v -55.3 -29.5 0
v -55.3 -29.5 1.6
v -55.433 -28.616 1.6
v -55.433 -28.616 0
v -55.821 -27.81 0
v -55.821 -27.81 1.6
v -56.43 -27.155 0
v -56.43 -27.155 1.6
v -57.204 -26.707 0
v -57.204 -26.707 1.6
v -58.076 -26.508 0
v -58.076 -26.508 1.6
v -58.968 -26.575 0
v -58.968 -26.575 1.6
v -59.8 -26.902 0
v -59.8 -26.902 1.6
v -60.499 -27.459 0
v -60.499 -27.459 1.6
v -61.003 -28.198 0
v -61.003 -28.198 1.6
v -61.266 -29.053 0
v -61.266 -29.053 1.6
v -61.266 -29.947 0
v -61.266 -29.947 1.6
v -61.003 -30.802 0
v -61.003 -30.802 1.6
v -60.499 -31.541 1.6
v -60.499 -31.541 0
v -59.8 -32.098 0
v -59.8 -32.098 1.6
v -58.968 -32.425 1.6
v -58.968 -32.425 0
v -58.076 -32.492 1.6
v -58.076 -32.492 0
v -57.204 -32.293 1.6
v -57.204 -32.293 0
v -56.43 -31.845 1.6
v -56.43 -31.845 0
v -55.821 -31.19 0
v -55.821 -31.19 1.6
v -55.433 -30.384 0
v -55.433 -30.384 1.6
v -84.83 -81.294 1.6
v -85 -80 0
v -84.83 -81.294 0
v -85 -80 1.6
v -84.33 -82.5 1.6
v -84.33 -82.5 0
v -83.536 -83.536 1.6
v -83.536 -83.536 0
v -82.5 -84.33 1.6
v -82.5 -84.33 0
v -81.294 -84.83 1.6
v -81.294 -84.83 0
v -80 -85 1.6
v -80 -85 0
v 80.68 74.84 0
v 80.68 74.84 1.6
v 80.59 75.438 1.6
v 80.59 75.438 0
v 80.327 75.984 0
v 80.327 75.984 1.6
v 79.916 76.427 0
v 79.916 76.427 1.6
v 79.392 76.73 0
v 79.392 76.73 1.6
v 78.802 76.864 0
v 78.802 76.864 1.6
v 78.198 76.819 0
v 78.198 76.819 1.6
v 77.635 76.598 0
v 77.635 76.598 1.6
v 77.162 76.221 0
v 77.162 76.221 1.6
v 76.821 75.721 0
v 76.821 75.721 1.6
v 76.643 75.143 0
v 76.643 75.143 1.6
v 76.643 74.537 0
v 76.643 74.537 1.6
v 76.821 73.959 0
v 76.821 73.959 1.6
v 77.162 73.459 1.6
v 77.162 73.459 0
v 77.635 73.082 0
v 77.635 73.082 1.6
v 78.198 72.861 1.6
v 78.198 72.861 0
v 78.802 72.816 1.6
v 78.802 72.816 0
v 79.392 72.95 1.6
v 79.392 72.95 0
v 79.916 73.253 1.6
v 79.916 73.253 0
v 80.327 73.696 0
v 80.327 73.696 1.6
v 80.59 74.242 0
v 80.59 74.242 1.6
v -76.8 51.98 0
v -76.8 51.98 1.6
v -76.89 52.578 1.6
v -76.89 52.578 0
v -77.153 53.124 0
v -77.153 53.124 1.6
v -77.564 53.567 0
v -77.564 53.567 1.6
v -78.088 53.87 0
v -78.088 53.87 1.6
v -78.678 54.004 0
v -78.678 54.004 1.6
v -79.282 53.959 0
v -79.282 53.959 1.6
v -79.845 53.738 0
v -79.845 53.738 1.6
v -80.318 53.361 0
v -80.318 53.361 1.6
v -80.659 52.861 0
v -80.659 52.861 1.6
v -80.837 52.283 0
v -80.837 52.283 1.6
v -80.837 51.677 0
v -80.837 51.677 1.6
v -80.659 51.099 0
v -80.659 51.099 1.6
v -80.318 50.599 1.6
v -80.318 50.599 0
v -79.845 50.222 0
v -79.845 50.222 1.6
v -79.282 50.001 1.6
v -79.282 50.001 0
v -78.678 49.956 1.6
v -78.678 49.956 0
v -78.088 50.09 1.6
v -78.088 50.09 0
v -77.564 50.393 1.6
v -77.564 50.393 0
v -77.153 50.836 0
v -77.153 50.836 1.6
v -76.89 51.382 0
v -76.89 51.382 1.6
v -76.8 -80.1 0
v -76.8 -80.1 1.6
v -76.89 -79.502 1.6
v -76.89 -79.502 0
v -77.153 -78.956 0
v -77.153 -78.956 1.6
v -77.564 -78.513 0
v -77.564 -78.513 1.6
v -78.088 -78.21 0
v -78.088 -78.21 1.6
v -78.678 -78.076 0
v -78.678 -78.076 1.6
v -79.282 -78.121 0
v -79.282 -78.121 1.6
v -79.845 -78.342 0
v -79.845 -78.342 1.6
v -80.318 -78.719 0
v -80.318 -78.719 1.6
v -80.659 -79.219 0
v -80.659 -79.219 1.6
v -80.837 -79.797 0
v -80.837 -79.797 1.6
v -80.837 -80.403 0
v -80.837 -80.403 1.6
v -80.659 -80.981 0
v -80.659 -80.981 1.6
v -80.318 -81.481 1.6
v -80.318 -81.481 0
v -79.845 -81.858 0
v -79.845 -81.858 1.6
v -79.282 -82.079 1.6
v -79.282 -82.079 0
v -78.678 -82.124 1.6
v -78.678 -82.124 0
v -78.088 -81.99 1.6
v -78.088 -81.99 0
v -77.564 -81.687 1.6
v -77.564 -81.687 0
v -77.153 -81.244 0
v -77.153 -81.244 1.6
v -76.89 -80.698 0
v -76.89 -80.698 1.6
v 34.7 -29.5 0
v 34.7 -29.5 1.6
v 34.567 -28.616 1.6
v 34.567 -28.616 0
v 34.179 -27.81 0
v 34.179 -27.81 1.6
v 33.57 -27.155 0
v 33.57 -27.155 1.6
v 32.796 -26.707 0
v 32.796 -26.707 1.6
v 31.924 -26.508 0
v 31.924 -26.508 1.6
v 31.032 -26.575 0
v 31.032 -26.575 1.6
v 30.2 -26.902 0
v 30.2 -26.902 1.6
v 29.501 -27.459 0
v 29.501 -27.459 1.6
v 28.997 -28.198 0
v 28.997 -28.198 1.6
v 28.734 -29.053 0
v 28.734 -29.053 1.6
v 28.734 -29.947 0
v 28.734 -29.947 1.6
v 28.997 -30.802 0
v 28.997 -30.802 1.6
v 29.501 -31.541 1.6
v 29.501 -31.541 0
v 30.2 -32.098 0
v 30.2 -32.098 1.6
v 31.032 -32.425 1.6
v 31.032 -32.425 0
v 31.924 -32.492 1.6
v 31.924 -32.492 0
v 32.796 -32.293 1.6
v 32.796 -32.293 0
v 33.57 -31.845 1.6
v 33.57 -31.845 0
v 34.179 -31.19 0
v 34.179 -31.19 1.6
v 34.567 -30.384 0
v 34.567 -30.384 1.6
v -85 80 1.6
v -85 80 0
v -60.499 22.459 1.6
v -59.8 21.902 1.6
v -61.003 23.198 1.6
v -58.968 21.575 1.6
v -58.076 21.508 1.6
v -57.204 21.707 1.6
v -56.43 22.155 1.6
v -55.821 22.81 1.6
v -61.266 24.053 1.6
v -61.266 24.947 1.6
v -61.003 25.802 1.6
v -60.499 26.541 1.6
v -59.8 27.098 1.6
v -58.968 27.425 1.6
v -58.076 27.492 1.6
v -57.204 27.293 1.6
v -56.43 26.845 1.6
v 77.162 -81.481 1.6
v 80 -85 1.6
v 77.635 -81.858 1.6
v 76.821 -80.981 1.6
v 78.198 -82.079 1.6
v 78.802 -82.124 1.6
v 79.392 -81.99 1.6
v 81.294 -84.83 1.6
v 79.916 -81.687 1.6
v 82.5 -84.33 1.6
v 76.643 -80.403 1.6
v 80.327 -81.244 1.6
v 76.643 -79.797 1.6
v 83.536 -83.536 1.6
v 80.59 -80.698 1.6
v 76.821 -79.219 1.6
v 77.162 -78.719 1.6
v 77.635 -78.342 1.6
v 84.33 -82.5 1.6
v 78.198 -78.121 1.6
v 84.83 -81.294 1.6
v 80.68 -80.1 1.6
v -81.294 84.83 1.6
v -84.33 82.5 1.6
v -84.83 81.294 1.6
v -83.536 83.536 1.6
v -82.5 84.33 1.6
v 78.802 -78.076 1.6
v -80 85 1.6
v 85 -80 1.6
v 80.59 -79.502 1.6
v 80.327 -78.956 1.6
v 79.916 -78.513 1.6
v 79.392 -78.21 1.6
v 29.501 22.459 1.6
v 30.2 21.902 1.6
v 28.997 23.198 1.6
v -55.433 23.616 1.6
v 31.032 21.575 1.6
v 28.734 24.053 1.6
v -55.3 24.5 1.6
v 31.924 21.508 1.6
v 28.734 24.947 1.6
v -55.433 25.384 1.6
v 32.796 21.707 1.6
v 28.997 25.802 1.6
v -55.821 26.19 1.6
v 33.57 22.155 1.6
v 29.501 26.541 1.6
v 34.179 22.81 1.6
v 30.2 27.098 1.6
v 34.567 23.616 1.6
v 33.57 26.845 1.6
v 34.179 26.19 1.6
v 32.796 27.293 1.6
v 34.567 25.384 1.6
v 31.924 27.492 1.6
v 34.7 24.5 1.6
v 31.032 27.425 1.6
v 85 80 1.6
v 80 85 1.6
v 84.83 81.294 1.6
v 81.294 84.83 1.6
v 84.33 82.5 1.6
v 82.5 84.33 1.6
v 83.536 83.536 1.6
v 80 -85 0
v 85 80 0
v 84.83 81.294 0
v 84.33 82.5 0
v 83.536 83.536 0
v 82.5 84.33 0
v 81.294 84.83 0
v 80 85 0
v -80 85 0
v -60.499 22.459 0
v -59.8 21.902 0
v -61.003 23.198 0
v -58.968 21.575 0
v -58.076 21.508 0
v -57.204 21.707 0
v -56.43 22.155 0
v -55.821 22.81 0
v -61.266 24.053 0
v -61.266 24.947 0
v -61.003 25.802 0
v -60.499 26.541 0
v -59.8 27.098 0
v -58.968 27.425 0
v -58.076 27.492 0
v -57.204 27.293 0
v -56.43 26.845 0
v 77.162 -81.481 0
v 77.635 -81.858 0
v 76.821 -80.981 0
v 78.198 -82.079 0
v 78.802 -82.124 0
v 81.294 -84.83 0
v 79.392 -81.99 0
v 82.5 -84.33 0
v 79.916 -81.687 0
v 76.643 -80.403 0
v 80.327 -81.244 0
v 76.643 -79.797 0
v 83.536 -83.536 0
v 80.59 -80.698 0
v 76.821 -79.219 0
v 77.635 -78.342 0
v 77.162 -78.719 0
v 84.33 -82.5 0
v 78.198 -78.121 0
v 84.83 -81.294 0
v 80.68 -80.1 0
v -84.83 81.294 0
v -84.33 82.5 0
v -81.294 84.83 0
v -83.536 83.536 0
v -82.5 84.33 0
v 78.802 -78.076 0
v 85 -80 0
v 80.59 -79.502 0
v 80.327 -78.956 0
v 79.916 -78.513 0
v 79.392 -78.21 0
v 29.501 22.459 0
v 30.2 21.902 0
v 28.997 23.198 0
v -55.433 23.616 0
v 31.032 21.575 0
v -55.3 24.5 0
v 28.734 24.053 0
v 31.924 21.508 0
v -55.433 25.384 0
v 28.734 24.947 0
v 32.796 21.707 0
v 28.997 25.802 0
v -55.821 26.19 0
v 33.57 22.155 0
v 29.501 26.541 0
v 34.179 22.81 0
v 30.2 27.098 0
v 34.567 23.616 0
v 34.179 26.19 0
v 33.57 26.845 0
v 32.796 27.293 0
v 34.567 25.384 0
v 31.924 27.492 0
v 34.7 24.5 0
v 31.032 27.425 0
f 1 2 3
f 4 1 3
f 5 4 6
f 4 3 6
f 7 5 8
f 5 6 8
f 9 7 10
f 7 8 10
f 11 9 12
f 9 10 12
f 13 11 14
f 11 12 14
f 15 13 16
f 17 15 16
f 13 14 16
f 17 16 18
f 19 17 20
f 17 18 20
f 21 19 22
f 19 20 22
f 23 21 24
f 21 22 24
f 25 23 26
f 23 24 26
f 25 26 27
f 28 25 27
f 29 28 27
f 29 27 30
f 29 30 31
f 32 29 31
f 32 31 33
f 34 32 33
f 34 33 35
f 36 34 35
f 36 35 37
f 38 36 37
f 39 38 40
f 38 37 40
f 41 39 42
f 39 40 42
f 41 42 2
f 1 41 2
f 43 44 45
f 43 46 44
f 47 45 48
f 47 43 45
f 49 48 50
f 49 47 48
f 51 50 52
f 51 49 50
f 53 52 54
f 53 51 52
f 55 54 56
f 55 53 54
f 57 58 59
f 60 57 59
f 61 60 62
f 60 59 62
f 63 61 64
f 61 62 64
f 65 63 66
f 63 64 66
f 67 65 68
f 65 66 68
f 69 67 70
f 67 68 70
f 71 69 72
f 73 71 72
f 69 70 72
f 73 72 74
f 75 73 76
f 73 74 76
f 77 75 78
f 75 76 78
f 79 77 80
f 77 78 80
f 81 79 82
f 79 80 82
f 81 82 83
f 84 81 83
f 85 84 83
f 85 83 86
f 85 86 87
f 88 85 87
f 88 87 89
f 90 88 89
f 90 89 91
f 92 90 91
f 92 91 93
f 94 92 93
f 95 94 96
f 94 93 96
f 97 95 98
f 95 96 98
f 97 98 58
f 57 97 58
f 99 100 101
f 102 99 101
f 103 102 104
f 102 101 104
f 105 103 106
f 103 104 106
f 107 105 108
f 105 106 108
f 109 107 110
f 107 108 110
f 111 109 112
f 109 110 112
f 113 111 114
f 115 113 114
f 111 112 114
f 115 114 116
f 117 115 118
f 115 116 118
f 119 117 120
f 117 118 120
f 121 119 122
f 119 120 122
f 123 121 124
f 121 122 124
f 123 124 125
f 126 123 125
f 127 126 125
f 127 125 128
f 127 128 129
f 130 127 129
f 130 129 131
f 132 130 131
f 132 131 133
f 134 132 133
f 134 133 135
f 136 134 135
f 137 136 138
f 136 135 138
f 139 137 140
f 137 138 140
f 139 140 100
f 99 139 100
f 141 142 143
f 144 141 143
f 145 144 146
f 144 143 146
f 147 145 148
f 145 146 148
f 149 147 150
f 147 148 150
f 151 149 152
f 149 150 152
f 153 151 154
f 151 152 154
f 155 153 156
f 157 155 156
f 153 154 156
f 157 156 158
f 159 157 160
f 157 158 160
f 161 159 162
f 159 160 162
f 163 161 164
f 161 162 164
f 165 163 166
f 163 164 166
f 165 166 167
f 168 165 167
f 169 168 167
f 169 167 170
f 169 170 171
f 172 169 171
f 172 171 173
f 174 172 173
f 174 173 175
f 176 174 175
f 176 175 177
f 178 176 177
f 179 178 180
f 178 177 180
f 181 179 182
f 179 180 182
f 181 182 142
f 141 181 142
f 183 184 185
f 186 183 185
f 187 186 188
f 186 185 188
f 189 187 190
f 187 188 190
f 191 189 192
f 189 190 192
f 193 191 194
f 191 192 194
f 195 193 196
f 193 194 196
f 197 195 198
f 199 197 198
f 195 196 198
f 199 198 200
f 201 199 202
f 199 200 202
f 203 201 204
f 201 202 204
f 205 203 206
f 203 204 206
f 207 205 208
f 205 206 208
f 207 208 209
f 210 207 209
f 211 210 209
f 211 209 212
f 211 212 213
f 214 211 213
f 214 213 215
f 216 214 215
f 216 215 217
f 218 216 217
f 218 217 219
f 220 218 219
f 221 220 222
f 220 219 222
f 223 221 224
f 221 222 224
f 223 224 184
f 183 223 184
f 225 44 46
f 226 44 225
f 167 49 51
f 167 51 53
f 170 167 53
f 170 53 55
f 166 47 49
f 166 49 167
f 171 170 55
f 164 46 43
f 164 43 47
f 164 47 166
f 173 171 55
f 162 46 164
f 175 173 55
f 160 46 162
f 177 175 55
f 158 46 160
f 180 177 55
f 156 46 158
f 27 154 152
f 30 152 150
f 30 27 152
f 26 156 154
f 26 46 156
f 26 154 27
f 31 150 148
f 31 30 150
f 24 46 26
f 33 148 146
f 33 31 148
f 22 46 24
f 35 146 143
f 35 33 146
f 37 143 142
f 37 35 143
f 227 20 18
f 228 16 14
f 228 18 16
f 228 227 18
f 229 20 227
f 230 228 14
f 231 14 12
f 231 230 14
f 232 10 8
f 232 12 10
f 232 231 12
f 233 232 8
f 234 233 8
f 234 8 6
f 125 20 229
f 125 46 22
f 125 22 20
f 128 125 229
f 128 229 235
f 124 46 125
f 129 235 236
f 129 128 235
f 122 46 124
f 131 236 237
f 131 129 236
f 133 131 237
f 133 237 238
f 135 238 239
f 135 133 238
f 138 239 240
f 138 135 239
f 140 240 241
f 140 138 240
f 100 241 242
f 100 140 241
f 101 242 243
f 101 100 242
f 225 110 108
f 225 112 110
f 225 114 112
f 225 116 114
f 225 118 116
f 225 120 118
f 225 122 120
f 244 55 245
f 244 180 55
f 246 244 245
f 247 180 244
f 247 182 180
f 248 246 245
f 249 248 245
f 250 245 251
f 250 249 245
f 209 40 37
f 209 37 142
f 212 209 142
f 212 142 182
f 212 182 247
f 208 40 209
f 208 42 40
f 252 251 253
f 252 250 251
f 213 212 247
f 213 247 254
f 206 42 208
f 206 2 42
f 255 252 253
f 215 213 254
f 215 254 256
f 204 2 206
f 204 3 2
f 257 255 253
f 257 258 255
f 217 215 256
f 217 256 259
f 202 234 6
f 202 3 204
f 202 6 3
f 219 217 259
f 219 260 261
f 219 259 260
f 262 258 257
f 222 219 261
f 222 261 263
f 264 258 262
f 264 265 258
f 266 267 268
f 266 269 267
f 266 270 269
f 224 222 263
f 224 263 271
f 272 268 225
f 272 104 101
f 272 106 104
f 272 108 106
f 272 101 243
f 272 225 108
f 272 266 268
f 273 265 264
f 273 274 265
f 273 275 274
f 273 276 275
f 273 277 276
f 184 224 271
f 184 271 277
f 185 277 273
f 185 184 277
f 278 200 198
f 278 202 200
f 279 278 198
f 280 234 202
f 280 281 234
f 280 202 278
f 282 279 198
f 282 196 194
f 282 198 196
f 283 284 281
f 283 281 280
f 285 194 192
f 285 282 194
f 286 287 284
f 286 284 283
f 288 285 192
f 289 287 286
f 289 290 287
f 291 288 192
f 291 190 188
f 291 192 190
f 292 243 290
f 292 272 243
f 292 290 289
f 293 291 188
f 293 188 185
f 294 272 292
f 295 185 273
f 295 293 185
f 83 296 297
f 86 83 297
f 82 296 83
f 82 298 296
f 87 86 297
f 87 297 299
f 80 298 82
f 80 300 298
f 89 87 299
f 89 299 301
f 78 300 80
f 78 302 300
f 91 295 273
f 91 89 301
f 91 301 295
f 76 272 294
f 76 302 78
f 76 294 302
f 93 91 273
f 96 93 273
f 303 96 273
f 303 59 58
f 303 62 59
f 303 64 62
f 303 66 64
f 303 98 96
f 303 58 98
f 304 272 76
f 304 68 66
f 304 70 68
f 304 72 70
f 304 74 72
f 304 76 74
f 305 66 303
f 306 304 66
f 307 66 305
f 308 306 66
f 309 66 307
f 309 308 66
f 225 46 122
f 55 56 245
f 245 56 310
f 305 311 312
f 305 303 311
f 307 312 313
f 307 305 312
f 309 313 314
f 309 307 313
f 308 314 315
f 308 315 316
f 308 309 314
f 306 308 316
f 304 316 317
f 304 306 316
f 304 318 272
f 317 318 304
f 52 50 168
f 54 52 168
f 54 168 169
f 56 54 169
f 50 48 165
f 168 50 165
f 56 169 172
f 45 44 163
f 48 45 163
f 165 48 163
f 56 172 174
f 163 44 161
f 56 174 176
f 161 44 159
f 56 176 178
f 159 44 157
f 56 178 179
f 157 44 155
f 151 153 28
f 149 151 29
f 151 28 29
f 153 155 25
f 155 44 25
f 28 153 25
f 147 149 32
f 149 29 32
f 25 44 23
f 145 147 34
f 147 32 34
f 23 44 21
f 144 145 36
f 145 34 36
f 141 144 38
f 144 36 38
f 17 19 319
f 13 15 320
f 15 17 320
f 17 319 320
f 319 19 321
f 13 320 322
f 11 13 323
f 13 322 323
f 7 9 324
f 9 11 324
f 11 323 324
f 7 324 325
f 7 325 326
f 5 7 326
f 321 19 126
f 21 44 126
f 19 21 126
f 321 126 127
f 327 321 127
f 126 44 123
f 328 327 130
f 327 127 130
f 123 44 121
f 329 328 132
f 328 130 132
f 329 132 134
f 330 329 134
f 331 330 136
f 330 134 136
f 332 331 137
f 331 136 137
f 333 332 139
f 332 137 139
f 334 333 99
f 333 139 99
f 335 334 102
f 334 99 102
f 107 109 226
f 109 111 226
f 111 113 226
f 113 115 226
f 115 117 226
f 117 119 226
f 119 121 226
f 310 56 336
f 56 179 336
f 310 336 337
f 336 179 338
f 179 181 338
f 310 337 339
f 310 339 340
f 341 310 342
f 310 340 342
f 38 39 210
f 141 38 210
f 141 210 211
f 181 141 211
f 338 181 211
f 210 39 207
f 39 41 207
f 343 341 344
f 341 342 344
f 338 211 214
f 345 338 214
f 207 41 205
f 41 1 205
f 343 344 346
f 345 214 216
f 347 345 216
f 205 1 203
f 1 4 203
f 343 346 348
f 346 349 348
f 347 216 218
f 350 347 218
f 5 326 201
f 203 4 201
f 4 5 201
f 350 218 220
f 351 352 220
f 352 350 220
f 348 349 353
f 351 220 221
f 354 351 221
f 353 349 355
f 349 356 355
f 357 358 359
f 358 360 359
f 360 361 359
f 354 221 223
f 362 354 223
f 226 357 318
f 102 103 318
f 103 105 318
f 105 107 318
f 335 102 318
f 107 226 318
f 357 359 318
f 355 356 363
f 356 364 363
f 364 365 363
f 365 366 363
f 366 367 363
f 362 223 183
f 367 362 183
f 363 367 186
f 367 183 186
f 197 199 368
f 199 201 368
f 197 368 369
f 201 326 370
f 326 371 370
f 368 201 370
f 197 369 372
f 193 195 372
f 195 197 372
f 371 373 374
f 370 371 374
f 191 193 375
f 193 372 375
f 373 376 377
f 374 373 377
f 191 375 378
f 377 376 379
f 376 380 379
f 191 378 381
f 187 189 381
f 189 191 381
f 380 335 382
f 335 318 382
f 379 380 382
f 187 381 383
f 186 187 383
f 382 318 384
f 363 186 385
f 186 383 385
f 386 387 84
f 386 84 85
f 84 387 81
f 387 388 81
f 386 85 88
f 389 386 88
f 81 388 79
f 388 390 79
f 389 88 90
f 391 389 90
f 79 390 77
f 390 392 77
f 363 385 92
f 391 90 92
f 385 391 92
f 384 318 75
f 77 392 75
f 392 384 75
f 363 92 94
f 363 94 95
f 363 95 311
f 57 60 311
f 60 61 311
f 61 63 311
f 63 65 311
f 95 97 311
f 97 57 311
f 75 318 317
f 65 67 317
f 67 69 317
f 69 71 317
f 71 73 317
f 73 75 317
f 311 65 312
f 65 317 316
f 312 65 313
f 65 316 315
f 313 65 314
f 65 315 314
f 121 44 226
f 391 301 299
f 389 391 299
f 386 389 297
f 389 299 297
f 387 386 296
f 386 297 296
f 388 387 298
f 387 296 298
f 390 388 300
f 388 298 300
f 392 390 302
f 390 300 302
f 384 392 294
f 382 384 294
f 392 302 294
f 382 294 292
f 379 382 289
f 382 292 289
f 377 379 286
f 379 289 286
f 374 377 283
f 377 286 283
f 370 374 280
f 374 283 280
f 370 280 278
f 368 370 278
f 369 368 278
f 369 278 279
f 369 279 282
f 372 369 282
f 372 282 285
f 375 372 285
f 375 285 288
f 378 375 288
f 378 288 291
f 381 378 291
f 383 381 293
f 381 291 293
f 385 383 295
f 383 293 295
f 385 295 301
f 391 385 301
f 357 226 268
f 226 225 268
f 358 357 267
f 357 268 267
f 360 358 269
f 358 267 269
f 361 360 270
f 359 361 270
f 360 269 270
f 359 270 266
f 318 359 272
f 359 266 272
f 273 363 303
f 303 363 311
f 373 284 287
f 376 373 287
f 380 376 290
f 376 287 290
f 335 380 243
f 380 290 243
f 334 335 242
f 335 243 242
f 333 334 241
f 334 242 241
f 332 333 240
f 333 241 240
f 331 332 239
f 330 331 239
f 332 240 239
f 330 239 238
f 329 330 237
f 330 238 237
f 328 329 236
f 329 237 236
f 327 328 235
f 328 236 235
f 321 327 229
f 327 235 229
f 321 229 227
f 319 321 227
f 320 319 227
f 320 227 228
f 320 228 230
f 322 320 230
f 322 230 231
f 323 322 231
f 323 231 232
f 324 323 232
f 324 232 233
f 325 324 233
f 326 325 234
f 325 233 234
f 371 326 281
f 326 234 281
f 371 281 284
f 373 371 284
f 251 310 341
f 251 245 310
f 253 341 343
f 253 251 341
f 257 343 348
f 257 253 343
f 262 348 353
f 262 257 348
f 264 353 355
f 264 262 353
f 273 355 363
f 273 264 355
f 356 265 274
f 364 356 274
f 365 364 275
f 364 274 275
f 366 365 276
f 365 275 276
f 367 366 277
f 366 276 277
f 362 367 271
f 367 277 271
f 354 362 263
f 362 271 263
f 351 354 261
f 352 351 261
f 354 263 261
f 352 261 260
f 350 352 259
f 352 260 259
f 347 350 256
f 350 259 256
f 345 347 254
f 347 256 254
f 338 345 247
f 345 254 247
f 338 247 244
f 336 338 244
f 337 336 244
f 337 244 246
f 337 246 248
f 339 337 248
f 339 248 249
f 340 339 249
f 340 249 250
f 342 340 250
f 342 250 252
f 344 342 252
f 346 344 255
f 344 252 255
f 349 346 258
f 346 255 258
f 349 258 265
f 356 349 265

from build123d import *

# Parameters (mm, degrees)
SKETCH1_W            = 170
SKETCH1_H            = 170
BASE_DEPTH           = 1.6
ROUNDING_CORNERS_R   = 5
SKETCH2_R            = 2.03
MOUNTING_HOLES_DEPTH = 1.6
SKETCH4_R            = 3
COOLER_HOLES_DEPTH   = 1.6


with BuildPart() as part:
    # Sketch1 → Base (new body)
    with BuildSketch(Plane.XY):
        Rectangle(SKETCH1_W, SKETCH1_H)
    extrude(amount=BASE_DEPTH)

    # Rounding corners
    rounding_corners_edges = [part.edges().sort_by_distance(p)[0] for p in [
        (-85, 85, 0.8),
        (85, 85, 0.8),
        (85, -85, 0.8),
        (-85, -85, 0.8),
    ]]
    fillet(rounding_corners_edges, radius=ROUNDING_CORNERS_R)

    # Sketch2 → Mounting holes (cut)
    with BuildSketch(Plane.XY.offset(1.6)):
        with Locations((-78.83, 51.98)):
            Circle(SKETCH2_R)
        with Locations((78.65, 74.84)):
            Circle(SKETCH2_R)
        with Locations((-78.83, -80.1)):
            Circle(SKETCH2_R)
        with Locations((78.65, -80.1)):
            Circle(SKETCH2_R)
    extrude(amount=-MOUNTING_HOLES_DEPTH, mode=Mode.SUBTRACT)

    # Sketch4 → Cooler holes (cut)
    with BuildSketch(Plane.XY.offset(1.6)):
        with Locations((-58.3, 24.5)):
            Circle(SKETCH4_R)
        with Locations((31.7, 24.5)):
            Circle(SKETCH4_R)
        with Locations((31.7, -29.5)):
            Circle(SKETCH4_R)
        with Locations((-58.3, -29.5)):
            Circle(SKETCH4_R)
    extrude(amount=-COOLER_HOLES_DEPTH, mode=Mode.SUBTRACT)


solid = part.part
